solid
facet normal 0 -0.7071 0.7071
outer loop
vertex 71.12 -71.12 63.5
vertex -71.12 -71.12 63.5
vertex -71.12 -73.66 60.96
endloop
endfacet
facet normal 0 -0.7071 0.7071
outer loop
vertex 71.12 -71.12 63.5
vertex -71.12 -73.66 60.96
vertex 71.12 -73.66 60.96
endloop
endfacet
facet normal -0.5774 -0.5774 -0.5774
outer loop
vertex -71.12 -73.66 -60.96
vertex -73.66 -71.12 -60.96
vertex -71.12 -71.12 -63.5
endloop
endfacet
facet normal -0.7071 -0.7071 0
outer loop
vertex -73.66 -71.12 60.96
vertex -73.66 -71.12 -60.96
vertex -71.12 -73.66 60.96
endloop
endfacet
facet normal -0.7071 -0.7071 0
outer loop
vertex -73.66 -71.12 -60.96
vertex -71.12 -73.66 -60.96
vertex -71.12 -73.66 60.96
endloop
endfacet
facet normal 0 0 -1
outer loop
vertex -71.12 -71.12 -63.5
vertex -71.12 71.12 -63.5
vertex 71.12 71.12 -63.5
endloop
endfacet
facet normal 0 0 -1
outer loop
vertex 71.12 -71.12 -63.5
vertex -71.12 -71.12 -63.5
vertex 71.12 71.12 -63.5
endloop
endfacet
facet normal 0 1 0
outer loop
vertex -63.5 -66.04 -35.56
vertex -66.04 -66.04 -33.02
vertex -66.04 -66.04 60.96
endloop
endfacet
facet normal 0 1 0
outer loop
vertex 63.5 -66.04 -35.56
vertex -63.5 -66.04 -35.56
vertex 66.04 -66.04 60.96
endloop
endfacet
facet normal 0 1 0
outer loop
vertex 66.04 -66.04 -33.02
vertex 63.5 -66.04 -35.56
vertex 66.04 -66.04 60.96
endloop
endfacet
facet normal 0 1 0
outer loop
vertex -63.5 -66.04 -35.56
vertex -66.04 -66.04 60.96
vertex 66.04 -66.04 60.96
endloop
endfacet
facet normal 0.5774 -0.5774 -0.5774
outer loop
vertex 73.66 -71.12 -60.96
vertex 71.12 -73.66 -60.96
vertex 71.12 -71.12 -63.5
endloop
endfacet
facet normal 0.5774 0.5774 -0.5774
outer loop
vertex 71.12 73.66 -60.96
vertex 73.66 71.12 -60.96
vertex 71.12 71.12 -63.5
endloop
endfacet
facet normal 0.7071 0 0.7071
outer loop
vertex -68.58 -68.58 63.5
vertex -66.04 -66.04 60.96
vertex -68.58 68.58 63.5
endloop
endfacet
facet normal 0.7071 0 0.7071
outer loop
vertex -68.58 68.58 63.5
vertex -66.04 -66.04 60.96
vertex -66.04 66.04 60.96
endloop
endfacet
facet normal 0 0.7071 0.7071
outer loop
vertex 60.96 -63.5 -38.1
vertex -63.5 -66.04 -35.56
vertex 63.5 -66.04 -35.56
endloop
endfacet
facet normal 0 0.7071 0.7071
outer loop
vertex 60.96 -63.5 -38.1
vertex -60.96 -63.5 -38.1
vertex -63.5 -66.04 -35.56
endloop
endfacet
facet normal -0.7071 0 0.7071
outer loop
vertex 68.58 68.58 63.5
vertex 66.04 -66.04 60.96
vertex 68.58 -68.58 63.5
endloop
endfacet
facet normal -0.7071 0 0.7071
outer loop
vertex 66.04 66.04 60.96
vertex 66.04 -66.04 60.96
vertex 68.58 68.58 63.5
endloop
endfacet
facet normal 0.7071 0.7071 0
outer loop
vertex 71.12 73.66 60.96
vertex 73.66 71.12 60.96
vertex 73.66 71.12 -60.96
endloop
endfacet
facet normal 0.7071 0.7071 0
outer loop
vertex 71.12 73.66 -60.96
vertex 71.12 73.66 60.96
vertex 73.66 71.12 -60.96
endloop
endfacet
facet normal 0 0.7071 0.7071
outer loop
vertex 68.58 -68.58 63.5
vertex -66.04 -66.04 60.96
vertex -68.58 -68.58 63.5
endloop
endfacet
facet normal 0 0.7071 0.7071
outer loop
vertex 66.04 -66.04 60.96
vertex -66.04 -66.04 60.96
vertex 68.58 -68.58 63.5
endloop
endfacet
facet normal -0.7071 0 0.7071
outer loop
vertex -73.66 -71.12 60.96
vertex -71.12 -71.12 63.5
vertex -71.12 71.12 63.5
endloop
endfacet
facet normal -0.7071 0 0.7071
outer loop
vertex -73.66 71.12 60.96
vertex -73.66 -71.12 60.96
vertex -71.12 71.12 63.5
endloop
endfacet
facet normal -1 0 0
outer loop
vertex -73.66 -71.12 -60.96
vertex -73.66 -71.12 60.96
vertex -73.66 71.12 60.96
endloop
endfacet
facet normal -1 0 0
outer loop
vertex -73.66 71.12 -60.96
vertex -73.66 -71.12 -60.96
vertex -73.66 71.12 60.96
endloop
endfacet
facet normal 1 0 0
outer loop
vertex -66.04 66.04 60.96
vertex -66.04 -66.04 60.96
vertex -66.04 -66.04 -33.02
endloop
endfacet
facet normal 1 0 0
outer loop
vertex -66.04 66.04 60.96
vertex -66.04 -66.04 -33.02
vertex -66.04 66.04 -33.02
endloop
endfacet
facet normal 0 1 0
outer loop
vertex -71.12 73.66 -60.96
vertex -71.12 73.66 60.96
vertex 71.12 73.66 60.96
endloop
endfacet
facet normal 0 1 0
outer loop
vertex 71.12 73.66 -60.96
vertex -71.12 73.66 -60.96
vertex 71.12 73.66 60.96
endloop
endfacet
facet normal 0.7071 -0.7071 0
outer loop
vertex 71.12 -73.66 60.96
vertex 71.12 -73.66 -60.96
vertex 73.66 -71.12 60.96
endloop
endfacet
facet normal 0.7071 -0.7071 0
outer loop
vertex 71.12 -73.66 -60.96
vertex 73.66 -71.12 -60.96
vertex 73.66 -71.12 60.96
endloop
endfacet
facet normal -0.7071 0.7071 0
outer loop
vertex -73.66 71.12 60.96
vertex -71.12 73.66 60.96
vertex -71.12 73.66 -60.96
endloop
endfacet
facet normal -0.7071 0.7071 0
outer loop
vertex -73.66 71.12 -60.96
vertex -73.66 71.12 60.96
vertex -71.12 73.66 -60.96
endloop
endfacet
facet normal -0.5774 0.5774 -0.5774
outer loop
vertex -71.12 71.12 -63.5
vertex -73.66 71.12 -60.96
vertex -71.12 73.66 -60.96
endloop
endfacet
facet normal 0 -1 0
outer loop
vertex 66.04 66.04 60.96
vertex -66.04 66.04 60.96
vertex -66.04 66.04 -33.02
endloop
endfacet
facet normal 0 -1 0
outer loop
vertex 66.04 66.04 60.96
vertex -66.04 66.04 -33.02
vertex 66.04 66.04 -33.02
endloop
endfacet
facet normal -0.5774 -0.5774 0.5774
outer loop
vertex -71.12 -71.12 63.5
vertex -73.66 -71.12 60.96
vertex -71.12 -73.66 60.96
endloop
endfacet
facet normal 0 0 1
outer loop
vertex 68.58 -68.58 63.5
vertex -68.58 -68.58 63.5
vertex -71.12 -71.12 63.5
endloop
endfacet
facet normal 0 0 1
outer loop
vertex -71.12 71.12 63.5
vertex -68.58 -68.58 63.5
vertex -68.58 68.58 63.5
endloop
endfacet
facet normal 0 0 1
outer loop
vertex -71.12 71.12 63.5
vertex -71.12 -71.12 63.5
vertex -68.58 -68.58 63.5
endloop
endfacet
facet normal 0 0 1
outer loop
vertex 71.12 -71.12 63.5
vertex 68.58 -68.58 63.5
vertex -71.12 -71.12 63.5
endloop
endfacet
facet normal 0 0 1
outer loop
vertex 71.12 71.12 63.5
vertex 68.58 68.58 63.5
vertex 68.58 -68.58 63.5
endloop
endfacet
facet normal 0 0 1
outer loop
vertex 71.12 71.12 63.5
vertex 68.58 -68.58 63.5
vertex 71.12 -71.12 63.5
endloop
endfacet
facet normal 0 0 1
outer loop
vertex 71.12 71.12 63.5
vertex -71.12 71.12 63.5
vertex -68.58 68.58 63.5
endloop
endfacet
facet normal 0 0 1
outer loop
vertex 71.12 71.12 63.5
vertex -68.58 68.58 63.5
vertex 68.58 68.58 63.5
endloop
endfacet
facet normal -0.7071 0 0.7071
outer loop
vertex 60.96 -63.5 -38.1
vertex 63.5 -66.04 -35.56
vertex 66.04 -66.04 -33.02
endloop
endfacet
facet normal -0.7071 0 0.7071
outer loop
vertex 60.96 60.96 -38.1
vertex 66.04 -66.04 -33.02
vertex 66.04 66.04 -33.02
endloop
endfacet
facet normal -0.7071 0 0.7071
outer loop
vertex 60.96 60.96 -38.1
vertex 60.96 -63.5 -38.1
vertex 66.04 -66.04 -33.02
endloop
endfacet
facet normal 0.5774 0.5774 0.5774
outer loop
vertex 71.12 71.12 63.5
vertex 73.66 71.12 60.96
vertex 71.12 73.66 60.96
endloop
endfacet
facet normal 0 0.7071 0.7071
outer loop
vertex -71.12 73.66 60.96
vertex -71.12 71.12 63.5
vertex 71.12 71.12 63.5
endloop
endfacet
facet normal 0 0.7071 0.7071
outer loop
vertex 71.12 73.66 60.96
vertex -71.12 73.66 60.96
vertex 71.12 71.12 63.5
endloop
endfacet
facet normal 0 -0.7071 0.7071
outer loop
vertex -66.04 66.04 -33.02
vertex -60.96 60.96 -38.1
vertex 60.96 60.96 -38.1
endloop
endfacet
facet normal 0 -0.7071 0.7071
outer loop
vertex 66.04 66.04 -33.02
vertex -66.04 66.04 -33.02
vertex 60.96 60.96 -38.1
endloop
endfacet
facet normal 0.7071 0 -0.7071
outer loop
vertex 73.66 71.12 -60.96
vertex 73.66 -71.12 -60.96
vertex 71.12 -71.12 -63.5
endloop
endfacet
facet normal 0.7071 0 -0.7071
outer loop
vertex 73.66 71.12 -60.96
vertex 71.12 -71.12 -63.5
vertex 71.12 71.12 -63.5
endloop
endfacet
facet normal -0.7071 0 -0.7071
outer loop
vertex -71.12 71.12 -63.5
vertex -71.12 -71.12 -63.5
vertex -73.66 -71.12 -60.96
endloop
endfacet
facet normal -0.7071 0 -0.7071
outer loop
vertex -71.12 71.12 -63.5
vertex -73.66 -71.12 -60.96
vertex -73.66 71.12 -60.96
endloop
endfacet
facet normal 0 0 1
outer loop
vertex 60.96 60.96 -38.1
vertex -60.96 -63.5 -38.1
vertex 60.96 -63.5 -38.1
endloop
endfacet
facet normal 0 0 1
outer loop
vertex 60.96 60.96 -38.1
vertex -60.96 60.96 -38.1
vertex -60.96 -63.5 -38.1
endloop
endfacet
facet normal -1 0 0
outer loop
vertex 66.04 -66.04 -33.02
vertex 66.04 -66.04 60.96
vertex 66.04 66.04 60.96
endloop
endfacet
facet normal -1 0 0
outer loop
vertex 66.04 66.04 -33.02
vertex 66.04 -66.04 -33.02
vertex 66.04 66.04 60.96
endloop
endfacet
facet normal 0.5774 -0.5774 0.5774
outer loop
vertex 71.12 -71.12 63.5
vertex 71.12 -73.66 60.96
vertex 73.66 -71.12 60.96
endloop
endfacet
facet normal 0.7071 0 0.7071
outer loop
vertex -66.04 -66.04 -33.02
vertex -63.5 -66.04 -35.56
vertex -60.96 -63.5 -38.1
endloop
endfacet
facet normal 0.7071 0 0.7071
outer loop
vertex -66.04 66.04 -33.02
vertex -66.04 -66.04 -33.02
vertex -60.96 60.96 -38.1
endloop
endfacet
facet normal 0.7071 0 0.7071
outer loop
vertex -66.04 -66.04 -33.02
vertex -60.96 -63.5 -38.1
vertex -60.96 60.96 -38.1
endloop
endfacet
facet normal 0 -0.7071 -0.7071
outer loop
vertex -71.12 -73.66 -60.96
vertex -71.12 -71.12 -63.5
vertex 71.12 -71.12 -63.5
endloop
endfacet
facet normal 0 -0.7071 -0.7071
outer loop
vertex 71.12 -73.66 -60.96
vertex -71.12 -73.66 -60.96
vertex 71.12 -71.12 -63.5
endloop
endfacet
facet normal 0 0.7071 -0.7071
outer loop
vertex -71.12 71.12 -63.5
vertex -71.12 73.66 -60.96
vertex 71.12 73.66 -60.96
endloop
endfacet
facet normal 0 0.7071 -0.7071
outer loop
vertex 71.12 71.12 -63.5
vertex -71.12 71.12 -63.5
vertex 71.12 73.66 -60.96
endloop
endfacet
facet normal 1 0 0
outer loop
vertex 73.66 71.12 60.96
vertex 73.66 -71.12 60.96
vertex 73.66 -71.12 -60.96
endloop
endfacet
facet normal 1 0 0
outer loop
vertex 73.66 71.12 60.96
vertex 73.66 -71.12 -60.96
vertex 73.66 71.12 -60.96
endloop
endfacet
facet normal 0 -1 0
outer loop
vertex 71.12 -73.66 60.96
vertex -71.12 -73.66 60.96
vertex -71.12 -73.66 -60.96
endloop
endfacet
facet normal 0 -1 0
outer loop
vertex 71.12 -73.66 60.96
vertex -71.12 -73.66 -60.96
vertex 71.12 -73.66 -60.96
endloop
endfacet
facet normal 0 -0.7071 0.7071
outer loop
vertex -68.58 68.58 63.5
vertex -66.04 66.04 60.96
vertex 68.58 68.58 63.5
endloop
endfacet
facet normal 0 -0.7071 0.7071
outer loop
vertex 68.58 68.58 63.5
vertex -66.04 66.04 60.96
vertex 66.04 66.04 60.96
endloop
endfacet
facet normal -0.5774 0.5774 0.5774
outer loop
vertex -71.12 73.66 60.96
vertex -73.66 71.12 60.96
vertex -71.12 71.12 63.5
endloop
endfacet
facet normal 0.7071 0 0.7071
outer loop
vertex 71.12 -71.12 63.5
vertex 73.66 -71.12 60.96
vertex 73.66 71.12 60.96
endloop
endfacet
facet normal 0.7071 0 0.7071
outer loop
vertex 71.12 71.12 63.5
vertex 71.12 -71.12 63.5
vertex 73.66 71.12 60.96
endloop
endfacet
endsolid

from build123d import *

# Parameters (mm, degrees)
F0_W     = 147.32
F0_H     = 147.32
F0_W_2   = 121.92
F0_H_2   = 121.92
F1_DEPTH = 63.5
F2_W     = 132.08
F2_H     = 132.08
F3_DEPTH = 101.6
F4_SIZE  = 2.54
F5_SIZE  = 5.08


with BuildPart() as f1:
    # F0 (on Top) → F1 (new body, symmetric)
    with BuildSketch(Plane.XY):
        Rectangle(F0_W, F0_H)
        Rectangle(F0_W_2, F0_H_2, mode=Mode.SUBTRACT)
        Rectangle(F0_W_2, F0_H_2)
    extrude(amount=F1_DEPTH, both=True)

    # F2 (on face) → F3 (cut)
    with BuildSketch(Plane.XY.offset(63.5)):
        Rectangle(F2_W, F2_H)
    extrude(amount=-F3_DEPTH, mode=Mode.SUBTRACT)

    # F4
    f4_edges = [f1.edges().sort_by_distance(p)[0] for p in [
        (-73.66, -73.66, 0),
        (-73.66, 0, 63.5),
        (-73.66, 73.66, 0),
        (-73.66, 0, -63.5),
        (0, -73.66, 63.5),
        (73.66, -73.66, 0),
        (0, -73.66, -63.5),
        (66.04, 0, 63.5),
        (0, -66.04, 63.5),
        (73.66, 0, 63.5),
        (73.66, 0, -63.5),
        (73.66, 73.66, 0),
        (0, 73.66, 63.5),
        (0, 73.66, -63.5),
        (-66.04, 0, 63.5),
        (0, 66.04, 63.5),
        (0, -66.04, -38.1),
    ]]
    chamfer(f4_edges, length=F4_SIZE)

    # F5
    f5_edges = [f1.edges().sort_by_distance(p)[0] for p in [
        (66.04, 1.27, -38.1),
        (0, 66.04, -38.1),
        (-66.04, 1.27, -38.1),
    ]]
    chamfer(f5_edges, length=F5_SIZE)


solid = f1.part
